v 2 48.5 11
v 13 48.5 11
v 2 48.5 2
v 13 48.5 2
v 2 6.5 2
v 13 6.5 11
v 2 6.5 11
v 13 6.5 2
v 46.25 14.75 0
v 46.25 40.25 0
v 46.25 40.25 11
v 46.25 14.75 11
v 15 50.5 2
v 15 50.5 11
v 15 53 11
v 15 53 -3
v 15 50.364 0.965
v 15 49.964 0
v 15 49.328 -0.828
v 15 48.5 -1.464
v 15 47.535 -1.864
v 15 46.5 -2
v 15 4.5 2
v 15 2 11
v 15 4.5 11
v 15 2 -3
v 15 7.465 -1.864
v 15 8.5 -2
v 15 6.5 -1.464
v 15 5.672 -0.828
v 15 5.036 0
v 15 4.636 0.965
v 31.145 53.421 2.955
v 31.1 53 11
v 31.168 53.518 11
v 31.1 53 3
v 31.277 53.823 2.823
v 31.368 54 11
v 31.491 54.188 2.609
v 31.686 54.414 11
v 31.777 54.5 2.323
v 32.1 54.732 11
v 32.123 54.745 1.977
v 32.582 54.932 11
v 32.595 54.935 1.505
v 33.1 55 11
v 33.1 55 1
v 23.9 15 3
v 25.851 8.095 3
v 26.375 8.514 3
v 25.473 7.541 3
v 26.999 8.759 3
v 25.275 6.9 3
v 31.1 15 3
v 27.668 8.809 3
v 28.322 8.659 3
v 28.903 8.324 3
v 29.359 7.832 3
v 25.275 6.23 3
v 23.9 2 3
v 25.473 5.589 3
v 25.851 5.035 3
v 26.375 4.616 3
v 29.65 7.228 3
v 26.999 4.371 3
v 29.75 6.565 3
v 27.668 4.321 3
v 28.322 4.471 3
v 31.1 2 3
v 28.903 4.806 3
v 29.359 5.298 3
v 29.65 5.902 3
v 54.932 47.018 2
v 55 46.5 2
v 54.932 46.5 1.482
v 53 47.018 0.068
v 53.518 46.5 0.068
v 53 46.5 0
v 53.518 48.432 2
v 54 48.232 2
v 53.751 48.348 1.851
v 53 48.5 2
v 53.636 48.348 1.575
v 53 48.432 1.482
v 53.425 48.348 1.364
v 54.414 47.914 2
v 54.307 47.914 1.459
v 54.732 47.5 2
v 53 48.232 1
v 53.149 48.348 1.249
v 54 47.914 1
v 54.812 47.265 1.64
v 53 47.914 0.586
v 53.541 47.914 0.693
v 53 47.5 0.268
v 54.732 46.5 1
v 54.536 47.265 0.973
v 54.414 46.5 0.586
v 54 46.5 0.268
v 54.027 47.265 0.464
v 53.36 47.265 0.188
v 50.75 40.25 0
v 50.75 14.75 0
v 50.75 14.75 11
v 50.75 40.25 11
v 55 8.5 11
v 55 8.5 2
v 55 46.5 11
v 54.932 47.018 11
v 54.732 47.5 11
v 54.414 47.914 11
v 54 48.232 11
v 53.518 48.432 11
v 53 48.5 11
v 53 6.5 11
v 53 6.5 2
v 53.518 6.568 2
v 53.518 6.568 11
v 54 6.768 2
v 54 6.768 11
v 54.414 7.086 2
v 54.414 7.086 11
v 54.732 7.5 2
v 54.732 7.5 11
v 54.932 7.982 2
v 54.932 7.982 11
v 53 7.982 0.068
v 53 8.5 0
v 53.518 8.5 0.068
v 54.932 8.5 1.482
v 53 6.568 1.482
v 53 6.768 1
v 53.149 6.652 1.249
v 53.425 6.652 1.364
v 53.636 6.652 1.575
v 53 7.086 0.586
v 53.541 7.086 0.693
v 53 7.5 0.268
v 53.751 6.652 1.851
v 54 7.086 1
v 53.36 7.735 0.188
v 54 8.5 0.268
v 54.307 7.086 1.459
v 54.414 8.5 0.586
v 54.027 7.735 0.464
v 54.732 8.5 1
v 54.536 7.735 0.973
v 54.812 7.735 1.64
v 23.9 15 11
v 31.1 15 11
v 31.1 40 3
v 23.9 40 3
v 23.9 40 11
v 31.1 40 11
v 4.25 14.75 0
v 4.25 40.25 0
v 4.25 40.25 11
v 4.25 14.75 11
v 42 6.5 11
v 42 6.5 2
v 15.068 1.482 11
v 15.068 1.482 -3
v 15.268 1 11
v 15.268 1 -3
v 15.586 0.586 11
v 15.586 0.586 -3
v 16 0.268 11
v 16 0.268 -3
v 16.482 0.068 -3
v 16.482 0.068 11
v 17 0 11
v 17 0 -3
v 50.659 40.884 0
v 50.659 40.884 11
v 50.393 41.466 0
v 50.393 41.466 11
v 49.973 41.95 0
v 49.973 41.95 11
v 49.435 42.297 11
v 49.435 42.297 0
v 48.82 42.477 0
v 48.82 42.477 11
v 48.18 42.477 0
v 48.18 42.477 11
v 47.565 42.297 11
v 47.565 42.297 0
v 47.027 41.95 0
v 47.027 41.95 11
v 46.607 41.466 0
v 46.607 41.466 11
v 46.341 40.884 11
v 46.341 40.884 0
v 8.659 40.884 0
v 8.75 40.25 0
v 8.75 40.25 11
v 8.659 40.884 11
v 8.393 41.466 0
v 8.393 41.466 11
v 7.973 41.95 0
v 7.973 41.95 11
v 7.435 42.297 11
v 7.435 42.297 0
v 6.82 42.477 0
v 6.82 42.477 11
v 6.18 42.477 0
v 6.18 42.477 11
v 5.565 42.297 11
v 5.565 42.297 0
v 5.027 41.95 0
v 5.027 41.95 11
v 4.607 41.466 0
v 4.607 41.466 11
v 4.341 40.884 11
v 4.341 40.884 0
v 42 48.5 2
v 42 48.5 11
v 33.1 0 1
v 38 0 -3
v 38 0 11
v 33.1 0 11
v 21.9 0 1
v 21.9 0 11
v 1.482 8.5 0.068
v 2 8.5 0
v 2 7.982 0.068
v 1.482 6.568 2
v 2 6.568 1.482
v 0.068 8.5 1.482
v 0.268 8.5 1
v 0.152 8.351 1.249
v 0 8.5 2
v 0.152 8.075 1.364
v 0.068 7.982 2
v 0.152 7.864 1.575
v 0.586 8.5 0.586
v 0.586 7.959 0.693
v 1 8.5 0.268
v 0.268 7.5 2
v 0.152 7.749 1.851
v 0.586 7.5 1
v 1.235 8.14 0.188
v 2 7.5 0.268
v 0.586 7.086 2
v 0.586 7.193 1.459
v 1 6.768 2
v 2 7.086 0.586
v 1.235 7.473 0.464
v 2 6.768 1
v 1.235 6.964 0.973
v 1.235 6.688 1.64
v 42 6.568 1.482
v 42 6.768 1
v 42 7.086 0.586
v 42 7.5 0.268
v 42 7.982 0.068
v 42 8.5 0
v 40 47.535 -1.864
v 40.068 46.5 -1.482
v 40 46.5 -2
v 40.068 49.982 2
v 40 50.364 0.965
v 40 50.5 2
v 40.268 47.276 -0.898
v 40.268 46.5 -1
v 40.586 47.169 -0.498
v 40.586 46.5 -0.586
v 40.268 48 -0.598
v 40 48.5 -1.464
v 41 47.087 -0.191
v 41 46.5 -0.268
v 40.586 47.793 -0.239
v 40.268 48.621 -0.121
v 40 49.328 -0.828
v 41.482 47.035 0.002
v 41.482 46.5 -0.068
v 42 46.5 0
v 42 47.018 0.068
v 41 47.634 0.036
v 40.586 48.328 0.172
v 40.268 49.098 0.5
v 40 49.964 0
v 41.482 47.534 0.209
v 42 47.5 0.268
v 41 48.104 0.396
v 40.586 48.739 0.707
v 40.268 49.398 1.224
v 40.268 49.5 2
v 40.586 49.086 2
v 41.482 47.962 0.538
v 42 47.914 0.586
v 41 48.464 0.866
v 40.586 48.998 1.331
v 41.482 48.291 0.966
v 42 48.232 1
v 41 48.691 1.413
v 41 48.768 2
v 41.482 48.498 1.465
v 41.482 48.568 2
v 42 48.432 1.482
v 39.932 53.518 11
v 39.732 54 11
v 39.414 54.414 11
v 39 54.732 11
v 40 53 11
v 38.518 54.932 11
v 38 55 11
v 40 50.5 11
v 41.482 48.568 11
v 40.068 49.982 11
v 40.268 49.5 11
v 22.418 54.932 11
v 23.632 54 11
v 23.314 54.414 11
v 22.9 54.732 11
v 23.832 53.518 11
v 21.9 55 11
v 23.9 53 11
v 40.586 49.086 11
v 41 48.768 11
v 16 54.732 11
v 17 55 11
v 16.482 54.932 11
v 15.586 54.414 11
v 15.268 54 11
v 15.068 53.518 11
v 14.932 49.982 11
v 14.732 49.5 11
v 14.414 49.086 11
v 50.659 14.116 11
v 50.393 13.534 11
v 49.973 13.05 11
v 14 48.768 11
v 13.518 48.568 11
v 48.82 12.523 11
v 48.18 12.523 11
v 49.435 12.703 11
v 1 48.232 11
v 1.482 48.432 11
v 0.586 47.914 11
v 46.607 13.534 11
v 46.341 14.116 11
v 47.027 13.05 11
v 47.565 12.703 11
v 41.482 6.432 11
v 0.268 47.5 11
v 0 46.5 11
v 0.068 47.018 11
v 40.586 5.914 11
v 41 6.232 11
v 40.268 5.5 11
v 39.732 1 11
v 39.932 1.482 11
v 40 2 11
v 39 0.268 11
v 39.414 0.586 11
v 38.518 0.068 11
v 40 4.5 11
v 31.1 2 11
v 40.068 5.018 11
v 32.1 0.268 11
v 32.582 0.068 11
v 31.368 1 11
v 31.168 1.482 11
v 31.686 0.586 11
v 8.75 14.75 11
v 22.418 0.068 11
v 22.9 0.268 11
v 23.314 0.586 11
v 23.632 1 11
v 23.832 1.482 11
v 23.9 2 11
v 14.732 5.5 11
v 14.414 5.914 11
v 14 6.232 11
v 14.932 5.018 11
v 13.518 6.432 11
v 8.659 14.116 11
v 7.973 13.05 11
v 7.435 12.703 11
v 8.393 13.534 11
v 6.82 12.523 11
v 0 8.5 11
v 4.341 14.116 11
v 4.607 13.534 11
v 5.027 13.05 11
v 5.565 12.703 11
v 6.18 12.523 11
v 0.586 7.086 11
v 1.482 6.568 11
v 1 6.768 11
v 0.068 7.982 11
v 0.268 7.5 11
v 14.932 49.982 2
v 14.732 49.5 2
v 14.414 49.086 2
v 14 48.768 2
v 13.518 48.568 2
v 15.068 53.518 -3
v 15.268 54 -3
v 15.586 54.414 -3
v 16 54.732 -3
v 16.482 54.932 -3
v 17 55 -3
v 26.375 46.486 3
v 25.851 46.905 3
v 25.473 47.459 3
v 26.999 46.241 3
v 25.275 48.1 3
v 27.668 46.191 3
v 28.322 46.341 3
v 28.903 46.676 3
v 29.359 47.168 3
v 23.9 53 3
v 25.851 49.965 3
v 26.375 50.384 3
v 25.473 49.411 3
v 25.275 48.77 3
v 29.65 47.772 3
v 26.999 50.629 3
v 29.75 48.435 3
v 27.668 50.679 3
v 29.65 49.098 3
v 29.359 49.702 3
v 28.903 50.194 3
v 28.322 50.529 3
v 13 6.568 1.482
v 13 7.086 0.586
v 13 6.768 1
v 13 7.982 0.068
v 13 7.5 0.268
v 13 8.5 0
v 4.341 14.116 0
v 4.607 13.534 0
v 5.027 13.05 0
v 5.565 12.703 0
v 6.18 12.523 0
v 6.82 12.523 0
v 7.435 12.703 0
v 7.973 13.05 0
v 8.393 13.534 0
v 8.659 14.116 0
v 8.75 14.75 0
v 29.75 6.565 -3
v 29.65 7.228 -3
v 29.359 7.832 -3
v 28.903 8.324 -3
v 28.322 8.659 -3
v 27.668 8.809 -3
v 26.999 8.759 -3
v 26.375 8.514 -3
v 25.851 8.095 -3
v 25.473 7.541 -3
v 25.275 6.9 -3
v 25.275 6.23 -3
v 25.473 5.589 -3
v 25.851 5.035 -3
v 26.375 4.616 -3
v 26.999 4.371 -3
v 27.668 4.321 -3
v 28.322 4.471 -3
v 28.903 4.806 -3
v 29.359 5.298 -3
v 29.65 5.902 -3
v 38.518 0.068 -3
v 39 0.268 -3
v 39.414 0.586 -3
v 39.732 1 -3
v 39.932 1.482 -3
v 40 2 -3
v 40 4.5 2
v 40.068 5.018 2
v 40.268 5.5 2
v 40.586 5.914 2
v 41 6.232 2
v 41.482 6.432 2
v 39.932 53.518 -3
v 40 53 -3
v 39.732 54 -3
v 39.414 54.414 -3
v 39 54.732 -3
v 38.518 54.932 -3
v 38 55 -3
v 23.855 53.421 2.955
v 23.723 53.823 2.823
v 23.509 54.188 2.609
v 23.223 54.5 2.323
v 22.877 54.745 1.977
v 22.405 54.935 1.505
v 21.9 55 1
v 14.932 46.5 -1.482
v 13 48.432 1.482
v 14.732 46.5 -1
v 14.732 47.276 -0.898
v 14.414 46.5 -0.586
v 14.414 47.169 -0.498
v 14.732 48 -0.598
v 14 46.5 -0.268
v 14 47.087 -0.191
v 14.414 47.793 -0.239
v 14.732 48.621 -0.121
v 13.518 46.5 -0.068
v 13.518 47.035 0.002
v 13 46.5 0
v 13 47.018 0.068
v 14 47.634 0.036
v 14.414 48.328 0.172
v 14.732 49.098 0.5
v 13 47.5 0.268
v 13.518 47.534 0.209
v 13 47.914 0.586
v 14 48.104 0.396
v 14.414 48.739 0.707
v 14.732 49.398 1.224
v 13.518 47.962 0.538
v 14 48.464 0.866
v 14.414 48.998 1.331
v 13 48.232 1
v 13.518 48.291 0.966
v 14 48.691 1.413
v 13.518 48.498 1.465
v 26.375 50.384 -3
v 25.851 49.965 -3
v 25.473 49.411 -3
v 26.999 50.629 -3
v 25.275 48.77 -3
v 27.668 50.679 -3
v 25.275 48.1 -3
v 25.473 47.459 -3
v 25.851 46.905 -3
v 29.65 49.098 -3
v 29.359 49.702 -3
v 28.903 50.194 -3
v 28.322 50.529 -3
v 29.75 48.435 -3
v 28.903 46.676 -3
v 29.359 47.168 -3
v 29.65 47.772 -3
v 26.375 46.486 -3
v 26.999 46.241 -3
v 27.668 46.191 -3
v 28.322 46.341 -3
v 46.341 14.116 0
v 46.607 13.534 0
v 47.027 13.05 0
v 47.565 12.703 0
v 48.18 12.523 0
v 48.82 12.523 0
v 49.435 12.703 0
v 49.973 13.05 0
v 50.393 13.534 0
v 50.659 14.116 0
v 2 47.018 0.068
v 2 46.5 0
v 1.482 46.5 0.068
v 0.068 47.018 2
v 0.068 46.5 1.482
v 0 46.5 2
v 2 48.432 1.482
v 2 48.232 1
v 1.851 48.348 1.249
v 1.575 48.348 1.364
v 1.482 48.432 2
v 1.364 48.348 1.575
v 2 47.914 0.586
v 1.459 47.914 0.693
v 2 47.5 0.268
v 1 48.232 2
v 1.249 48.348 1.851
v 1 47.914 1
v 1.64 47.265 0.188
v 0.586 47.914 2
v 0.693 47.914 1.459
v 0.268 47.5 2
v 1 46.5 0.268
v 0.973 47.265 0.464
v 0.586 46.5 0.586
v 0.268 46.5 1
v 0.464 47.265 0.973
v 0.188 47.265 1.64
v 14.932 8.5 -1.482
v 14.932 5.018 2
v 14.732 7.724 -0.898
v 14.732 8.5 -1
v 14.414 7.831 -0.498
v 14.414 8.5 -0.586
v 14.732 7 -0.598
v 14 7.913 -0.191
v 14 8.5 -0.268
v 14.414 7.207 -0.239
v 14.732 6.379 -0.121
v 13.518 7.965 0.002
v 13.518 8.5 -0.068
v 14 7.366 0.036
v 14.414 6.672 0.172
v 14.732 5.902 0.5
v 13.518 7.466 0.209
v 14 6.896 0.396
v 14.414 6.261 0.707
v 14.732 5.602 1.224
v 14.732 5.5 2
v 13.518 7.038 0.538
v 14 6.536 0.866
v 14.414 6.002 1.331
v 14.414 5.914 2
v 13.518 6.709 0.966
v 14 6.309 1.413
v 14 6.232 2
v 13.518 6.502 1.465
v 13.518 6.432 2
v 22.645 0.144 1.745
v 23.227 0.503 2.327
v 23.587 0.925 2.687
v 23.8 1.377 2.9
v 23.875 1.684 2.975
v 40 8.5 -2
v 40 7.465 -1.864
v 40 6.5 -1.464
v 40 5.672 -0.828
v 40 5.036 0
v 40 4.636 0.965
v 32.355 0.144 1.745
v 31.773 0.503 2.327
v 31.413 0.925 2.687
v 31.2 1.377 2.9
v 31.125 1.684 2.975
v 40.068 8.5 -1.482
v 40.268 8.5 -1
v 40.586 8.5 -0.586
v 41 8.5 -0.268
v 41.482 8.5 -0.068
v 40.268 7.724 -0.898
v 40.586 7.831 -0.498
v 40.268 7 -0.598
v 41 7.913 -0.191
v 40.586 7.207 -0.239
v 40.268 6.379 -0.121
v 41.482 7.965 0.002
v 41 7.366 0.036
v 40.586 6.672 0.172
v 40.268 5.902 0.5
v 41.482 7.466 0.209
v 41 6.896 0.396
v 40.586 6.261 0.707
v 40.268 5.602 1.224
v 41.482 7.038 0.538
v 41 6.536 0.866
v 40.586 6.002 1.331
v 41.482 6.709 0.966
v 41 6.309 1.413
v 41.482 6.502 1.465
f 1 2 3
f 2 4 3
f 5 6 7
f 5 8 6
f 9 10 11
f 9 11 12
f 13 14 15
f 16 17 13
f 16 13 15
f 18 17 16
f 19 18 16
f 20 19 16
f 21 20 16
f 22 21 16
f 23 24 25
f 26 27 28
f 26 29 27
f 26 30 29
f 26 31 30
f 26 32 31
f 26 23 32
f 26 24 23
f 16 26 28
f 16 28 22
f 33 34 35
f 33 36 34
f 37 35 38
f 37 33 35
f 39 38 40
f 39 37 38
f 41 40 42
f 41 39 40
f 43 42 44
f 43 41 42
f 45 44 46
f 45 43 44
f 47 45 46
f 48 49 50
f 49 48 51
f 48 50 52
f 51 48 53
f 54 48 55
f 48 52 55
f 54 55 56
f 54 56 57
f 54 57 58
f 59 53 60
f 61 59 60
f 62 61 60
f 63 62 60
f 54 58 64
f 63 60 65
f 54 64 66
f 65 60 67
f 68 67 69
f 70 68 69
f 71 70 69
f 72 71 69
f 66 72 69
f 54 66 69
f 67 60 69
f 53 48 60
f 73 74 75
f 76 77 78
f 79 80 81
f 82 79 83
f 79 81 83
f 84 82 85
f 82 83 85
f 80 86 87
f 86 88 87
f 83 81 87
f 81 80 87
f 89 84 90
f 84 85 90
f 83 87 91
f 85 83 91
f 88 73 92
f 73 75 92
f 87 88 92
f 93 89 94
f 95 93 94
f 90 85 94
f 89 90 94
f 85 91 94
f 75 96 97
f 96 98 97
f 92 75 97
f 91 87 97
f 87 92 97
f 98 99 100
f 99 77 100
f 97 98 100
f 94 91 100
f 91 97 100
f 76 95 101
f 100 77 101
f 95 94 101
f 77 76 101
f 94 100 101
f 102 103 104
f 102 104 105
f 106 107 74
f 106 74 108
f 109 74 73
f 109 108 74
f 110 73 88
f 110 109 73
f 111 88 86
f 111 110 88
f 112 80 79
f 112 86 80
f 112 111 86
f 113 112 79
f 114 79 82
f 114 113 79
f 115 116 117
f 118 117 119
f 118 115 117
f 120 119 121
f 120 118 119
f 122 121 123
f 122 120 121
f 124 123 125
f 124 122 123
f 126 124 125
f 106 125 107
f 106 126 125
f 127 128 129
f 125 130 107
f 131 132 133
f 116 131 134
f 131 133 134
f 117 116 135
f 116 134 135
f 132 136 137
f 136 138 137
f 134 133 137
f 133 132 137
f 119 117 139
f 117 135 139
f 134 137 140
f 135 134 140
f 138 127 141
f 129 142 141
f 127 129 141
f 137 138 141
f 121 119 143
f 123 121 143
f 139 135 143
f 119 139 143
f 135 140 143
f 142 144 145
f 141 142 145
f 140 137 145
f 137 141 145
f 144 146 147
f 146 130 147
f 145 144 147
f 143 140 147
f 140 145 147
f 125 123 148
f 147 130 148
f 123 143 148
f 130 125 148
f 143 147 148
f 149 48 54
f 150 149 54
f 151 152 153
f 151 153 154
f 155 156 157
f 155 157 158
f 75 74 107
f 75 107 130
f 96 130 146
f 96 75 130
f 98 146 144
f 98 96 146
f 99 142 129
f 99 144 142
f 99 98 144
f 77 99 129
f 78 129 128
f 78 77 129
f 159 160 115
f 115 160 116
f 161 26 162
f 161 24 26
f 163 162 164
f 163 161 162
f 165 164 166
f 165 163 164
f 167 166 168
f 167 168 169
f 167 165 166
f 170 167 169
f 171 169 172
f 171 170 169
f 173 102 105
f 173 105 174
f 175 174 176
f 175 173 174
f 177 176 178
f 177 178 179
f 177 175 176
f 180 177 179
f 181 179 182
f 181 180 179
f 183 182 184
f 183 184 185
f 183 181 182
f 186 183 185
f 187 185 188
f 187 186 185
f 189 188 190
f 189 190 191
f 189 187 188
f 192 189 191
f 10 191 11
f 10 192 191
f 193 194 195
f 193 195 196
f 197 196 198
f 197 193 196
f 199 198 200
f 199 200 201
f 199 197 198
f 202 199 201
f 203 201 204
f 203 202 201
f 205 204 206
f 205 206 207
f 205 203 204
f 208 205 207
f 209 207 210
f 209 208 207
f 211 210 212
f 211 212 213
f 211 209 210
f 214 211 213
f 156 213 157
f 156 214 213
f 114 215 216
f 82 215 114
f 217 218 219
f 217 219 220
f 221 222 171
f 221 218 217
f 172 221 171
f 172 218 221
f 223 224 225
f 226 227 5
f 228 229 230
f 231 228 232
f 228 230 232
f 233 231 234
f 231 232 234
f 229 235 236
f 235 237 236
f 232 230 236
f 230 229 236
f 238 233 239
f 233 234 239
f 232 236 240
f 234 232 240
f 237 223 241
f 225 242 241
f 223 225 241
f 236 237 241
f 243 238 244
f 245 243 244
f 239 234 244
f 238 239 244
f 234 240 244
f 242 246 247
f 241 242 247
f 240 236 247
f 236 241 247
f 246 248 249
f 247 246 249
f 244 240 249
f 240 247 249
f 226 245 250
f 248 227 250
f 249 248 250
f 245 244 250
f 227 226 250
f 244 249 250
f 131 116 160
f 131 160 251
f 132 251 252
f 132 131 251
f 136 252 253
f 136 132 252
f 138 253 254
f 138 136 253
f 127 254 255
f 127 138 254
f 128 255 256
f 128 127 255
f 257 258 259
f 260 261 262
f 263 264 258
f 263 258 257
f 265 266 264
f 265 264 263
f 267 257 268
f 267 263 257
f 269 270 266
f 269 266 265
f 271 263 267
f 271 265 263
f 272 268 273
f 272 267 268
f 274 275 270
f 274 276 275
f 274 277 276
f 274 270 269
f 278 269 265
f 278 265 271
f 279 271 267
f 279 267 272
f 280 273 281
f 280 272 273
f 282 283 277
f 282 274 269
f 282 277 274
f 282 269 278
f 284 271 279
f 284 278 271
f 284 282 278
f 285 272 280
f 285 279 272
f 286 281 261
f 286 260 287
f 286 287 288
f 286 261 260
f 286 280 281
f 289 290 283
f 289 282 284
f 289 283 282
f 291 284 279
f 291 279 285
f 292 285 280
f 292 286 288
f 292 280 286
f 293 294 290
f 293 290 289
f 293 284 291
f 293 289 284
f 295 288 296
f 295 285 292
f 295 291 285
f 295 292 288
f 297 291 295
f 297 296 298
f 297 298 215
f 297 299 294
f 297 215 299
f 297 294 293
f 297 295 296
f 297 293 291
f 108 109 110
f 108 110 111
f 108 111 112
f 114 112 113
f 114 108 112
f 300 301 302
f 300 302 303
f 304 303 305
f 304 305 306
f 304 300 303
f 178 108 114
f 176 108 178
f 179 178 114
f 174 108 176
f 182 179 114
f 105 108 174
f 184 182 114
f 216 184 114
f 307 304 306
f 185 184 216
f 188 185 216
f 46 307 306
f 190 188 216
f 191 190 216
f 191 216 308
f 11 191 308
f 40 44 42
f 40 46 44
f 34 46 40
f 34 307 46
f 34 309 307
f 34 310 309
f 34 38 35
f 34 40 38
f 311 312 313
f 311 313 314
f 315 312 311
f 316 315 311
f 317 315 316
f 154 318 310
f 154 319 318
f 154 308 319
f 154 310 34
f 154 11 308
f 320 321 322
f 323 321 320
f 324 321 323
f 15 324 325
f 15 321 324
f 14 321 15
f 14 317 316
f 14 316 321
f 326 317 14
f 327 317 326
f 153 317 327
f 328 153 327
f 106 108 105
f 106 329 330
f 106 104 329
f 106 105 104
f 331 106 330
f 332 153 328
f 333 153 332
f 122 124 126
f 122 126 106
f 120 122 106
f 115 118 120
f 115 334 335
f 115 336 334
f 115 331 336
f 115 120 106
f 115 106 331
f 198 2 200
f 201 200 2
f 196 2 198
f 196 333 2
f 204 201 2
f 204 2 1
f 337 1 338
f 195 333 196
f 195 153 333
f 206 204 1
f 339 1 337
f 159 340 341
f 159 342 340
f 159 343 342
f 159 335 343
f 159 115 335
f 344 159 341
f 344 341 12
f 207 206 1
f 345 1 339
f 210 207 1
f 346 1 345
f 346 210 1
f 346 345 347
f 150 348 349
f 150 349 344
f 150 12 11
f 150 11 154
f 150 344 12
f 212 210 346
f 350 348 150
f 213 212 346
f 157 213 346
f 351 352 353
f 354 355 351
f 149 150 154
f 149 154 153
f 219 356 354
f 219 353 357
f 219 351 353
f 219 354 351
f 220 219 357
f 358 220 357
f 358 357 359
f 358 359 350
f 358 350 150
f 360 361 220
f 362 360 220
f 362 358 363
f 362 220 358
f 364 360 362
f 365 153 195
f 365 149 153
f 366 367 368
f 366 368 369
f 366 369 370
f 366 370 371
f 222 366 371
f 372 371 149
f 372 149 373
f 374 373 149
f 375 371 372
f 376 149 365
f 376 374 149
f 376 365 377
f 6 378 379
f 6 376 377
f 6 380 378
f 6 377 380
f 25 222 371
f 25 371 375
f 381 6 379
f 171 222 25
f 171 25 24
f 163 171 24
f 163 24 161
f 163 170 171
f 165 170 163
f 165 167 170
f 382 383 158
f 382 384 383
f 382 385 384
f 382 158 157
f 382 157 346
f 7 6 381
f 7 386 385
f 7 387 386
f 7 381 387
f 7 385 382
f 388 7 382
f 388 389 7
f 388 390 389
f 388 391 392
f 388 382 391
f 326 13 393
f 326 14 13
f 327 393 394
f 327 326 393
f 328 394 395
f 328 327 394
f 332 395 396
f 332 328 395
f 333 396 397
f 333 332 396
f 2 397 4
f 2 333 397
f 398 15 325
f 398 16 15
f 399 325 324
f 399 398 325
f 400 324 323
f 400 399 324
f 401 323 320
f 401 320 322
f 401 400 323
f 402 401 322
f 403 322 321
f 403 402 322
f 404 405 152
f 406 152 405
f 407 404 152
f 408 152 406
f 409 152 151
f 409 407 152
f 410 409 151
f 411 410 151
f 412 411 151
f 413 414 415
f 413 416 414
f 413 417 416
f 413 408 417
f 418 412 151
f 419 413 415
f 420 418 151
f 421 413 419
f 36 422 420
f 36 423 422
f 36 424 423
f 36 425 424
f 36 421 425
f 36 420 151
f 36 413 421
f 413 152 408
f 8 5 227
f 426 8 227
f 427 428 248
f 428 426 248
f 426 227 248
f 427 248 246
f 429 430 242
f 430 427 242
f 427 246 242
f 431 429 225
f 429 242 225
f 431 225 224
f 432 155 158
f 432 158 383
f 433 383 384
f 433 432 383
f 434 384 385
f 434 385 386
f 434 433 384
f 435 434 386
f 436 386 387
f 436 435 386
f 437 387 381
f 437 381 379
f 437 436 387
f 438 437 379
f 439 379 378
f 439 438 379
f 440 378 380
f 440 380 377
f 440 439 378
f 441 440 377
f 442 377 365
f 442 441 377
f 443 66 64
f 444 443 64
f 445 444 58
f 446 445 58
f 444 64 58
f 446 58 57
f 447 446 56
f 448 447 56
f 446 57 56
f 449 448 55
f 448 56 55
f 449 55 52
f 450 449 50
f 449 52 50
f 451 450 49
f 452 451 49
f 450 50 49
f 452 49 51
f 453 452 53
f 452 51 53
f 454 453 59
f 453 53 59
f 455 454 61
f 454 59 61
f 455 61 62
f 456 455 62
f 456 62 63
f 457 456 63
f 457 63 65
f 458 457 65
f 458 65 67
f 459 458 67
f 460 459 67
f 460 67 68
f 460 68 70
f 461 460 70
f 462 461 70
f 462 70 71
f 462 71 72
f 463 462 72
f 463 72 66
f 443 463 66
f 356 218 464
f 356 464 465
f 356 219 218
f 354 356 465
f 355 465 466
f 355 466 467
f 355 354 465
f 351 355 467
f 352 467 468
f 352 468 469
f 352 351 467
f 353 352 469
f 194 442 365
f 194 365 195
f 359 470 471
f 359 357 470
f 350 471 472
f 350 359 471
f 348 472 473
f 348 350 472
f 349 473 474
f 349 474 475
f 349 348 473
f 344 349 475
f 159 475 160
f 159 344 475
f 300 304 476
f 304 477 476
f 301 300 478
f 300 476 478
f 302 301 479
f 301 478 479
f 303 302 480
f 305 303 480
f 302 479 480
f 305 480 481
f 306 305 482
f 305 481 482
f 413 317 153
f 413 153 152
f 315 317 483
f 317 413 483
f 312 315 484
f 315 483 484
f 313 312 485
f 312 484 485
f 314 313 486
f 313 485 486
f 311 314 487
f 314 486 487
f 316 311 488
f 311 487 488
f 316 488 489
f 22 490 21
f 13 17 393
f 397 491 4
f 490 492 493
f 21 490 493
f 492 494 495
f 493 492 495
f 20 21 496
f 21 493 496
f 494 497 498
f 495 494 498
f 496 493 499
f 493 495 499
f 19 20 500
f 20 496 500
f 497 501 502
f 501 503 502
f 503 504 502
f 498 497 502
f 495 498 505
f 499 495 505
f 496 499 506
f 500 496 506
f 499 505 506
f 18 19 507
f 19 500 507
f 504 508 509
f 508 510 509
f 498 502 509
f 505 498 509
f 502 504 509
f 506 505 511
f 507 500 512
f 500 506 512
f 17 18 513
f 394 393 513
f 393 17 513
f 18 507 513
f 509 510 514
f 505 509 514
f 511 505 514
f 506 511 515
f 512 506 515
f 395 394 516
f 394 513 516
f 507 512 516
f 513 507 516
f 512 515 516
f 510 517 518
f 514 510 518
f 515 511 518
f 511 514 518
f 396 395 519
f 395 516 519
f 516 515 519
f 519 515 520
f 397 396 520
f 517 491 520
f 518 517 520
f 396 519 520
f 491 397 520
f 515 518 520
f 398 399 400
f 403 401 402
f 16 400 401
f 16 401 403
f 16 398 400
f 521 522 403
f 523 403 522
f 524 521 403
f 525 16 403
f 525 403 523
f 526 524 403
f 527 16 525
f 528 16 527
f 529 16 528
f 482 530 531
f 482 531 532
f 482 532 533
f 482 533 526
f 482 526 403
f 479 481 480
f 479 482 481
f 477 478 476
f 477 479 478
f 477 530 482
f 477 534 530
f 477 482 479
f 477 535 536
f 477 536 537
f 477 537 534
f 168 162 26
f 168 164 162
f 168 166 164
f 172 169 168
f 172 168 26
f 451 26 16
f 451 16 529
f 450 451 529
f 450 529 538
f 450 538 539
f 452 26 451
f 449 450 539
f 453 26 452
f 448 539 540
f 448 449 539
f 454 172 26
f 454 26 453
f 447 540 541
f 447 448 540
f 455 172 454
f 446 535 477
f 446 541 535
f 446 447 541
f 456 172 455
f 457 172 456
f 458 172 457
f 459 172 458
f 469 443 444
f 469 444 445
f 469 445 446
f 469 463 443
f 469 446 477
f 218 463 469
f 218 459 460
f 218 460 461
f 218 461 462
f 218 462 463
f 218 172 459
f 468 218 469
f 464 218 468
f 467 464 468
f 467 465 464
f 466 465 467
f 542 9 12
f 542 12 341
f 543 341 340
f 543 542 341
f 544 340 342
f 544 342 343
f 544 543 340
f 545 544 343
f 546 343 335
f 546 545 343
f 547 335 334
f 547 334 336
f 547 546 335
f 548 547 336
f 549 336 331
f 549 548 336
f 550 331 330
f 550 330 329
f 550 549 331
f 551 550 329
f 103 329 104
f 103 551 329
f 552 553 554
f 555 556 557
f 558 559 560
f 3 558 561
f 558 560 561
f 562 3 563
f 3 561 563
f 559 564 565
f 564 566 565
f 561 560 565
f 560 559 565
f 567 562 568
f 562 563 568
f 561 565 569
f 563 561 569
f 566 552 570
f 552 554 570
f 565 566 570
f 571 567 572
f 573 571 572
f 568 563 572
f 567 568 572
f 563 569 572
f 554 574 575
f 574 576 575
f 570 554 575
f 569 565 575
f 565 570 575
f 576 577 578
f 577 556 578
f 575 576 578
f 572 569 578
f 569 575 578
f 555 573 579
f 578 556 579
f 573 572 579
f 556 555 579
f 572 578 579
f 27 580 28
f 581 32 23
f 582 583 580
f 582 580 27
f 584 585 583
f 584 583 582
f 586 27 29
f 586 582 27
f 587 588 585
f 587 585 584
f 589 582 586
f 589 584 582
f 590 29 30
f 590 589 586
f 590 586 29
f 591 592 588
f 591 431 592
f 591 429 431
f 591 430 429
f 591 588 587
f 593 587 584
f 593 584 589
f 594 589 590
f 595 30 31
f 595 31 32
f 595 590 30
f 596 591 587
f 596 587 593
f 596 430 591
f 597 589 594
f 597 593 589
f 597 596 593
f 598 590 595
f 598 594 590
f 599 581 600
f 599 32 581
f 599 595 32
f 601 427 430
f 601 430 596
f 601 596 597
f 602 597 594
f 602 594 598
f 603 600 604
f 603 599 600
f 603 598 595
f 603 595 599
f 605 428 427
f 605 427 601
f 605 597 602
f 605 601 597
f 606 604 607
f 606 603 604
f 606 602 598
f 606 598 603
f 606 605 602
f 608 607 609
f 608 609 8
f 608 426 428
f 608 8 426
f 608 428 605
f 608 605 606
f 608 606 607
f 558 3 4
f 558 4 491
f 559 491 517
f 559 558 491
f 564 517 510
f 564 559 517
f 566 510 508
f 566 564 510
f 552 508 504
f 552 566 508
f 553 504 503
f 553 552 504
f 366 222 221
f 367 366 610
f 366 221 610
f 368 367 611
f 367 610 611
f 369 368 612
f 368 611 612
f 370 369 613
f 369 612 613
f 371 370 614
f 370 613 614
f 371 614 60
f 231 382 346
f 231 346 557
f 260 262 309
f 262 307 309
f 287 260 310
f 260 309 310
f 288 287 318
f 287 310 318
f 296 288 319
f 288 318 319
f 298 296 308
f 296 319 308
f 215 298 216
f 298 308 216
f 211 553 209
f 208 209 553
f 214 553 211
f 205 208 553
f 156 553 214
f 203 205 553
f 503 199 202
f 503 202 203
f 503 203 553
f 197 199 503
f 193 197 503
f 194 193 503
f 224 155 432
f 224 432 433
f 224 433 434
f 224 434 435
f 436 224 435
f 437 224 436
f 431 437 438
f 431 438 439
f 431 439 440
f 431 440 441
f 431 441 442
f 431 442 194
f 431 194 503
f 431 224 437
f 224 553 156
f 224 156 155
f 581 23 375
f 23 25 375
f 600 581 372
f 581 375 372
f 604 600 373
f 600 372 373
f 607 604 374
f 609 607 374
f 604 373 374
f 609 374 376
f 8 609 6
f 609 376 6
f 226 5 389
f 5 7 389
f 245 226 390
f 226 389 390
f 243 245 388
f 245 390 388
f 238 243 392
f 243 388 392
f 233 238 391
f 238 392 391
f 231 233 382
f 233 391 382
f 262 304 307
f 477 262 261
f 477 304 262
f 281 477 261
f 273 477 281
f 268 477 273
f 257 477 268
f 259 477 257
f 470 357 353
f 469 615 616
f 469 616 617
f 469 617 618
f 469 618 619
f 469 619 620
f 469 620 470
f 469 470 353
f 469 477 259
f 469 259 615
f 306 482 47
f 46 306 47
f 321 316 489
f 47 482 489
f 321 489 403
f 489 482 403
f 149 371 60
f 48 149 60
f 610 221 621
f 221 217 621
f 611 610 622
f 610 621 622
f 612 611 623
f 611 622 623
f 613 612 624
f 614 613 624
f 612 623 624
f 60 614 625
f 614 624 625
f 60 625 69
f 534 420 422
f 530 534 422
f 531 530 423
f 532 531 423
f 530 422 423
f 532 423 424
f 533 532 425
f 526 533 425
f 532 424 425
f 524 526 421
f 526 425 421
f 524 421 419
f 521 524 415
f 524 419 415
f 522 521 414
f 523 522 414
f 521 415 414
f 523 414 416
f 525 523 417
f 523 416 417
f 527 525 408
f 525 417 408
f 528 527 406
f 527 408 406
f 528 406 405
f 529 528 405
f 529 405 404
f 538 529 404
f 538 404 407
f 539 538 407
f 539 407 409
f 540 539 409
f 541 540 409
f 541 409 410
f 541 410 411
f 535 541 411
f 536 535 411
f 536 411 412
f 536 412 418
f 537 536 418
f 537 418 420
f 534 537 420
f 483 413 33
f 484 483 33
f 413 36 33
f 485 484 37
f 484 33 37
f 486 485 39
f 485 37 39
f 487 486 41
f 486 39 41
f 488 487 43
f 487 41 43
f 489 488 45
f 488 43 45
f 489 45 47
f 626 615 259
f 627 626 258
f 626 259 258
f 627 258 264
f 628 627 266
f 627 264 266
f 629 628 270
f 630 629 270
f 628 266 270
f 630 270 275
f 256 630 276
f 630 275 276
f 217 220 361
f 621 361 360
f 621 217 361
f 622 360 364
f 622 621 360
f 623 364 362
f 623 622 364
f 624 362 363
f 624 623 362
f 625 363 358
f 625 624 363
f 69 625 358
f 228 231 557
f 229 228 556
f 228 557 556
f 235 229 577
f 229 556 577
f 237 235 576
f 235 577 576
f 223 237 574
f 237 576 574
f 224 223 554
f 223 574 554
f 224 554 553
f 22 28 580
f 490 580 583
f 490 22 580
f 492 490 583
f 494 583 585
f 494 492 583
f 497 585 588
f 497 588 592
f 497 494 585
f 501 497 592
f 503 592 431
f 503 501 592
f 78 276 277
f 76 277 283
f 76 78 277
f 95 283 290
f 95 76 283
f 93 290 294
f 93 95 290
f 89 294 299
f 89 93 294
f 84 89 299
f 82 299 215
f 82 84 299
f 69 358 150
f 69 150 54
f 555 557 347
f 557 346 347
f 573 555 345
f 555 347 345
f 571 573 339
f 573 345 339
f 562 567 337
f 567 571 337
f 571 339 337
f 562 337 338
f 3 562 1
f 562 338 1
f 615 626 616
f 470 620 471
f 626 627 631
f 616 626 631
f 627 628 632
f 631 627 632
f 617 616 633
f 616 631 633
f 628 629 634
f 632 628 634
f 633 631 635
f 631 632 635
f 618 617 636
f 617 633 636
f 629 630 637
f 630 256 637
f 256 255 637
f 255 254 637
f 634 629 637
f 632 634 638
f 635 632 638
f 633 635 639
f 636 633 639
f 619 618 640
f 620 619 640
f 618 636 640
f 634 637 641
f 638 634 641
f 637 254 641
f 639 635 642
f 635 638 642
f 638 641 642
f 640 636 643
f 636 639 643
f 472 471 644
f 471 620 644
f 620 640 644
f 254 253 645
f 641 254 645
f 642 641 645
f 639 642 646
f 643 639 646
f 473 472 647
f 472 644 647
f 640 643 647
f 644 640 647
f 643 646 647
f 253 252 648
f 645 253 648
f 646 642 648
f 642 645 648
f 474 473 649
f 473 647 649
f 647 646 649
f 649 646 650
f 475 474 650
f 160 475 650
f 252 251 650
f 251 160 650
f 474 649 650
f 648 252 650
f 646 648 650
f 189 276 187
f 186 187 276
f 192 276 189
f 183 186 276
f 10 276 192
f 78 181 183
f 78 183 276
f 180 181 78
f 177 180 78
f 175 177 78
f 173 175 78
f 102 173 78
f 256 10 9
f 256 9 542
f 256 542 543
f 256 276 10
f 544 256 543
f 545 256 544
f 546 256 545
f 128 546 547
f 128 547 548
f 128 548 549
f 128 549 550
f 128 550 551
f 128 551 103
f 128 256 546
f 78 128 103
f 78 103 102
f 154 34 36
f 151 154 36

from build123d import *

# Parameters (mm, degrees)
BOSS_EXTRUDE1_DEPTH      = 55
M4_CLEARANCE_HOLE1_D     = 4.5
M4_CLEARANCE_SLOT1_DEPTH = 11
SKETCH6_W                = 7.2
SKETCH6_H                = 8
CUT_EXTRUDE1_DEPTH       = 15
SKETCH7_W                = 15
SKETCH7_H                = 6.5
CUT_EXTRUDE3_DEPTH       = 79.555712714
MIRROR3_COPY_1_SKETCH_W  = 15
MIRROR3_COPY_1_SKETCH_H  = 6.5
MIRROR3_COPY_1_DEPTH     = 79.555712714
FILLET1_R                = 2


# Read off the part's stored shape, not the designer's step: M4 Clearance Slot1
with BuildPart() as part:
    # Sketch1 → Boss-Extrude1 (new body)
    with BuildSketch(Plane(origin=(0, 0, 0), x_dir=(1, 0, 0), z_dir=(0, 1, 0))):
        Polygon((0, 0), (15, 0), (15, 3), (40, 3), (40, 0), (55, 0), (55, -11), (0, -11), align=None)
    extrude(amount=BOSS_EXTRUDE1_DEPTH)

    # M4 Clearance Hole1 (through all)
    with Locations(Plane(origin=(0, 0, -3), x_dir=(-1, 0, 0), z_dir=(0, 0, -1))):
        with Locations((-27.5, 48.435), (-27.5, 6.565)):
            Hole(M4_CLEARANCE_HOLE1_D / 2)

    # M4 Clearance Slot1 outline → M4 Clearance Slot1 (cut)
    with BuildSketch(Plane.XY):
        with BuildLine():
            ThreePointArc((46.25, 14.75), (48.5, 12.5), (50.75, 14.75))
            Line((50.75, 14.75), (50.75, 40.25))
            ThreePointArc((50.75, 40.25), (48.5, 42.5), (46.25, 40.25))
            Line((46.25, 40.25), (46.25, 14.75))
        make_face()
        with BuildLine():
            ThreePointArc((4.25, 14.75), (6.5, 12.5), (8.75, 14.75))
            Line((8.75, 14.75), (8.75, 40.25))
            ThreePointArc((8.75, 40.25), (6.5, 42.5), (4.25, 40.25))
            Line((4.25, 40.25), (4.25, 14.75))
        make_face()
    extrude(amount=M4_CLEARANCE_SLOT1_DEPTH, mode=Mode.SUBTRACT)

    # Sketch6 → Cut-Extrude1 (cut)
    with BuildSketch(Plane(origin=(0, 55, 0), x_dir=(1, 0, 0), z_dir=(0, 1, 0))):
        with Locations((27.5, -7)):
            Rectangle(SKETCH6_W, SKETCH6_H)
    cut_extrude1 = extrude(amount=-CUT_EXTRUDE1_DEPTH, mode=Mode.SUBTRACT)

    # Mirror1: Cut-Extrude1 across plane
    add(cut_extrude1.mirror(Plane.ZX.offset(27.5)), mode=Mode.SUBTRACT)

    # Sketch7 → Cut-Extrude3 (cut, through all)
    with BuildSketch(Plane(origin=(0, 0, 0), x_dir=(-1, 0, 0), z_dir=(0, 0, -1))):
        with Locations((-7.5, 3.25)):
            Rectangle(SKETCH7_W, SKETCH7_H)
    cut_extrude3 = extrude(amount=-CUT_EXTRUDE3_DEPTH, mode=Mode.SUBTRACT)

    # Mirror2: Cut-Extrude3 across plane
    add(cut_extrude3.mirror(Plane(origin=(0, 27.5, 0), x_dir=(0, 0, 1), z_dir=(0, -1, 0))), mode=Mode.SUBTRACT)

    # Mirror3: Cut-Extrude3 across plane
    add(cut_extrude3.mirror(Plane(origin=(27.5, 0, 0), x_dir=(0, 0, 1), z_dir=(1, 0, 0))), mode=Mode.SUBTRACT)

    # Mirror3 copy 1 sketch → Mirror3 copy 1 (cut, through all)
    with BuildSketch(Plane(origin=(55, 55, 0), x_dir=(1, 0, 0), z_dir=(0, 0, -1))):
        with Locations((-7.5, 3.25)):
            Rectangle(MIRROR3_COPY_1_SKETCH_W, MIRROR3_COPY_1_SKETCH_H)
    extrude(amount=-MIRROR3_COPY_1_DEPTH, mode=Mode.SUBTRACT)

    # Fillet1
    fillet1_edges = [part.edges().sort_by_distance(p)[0] for p in [
        (7.5, 6.5, 0),
        (15, 27.5, 0),
        (0, 27.5, 0),
        (15, 48.5, 5.5),
        (7.5, 48.5, 0),
        (0, 48.5, 5.5),
        (40, 27.5, 0),
        (55, 27.5, 0),
        (40, 48.5, 5.5),
        (55, 48.5, 5.5),
        (47.5, 48.5, 0),
        (40, 6.5, 5.5),
        (47.5, 6.5, 0),
        (55, 6.5, 5.5),
        (40, 55, 4),
        (15, 55, 4),
        (23.9, 55, 7),
        (31.1, 55, 7),
        (27.5, 55, 3),
        (27.5, 0, 3),
        (23.9, 0, 7),
        (31.1, 0, 7),
        (15, 0, 4),
        (40, 0, 4),
        (15, 6.5, 5.5),
        (0, 6.5, 5.5),
    ]]
    fillet(fillet1_edges, radius=FILLET1_R)


solid = part.part
